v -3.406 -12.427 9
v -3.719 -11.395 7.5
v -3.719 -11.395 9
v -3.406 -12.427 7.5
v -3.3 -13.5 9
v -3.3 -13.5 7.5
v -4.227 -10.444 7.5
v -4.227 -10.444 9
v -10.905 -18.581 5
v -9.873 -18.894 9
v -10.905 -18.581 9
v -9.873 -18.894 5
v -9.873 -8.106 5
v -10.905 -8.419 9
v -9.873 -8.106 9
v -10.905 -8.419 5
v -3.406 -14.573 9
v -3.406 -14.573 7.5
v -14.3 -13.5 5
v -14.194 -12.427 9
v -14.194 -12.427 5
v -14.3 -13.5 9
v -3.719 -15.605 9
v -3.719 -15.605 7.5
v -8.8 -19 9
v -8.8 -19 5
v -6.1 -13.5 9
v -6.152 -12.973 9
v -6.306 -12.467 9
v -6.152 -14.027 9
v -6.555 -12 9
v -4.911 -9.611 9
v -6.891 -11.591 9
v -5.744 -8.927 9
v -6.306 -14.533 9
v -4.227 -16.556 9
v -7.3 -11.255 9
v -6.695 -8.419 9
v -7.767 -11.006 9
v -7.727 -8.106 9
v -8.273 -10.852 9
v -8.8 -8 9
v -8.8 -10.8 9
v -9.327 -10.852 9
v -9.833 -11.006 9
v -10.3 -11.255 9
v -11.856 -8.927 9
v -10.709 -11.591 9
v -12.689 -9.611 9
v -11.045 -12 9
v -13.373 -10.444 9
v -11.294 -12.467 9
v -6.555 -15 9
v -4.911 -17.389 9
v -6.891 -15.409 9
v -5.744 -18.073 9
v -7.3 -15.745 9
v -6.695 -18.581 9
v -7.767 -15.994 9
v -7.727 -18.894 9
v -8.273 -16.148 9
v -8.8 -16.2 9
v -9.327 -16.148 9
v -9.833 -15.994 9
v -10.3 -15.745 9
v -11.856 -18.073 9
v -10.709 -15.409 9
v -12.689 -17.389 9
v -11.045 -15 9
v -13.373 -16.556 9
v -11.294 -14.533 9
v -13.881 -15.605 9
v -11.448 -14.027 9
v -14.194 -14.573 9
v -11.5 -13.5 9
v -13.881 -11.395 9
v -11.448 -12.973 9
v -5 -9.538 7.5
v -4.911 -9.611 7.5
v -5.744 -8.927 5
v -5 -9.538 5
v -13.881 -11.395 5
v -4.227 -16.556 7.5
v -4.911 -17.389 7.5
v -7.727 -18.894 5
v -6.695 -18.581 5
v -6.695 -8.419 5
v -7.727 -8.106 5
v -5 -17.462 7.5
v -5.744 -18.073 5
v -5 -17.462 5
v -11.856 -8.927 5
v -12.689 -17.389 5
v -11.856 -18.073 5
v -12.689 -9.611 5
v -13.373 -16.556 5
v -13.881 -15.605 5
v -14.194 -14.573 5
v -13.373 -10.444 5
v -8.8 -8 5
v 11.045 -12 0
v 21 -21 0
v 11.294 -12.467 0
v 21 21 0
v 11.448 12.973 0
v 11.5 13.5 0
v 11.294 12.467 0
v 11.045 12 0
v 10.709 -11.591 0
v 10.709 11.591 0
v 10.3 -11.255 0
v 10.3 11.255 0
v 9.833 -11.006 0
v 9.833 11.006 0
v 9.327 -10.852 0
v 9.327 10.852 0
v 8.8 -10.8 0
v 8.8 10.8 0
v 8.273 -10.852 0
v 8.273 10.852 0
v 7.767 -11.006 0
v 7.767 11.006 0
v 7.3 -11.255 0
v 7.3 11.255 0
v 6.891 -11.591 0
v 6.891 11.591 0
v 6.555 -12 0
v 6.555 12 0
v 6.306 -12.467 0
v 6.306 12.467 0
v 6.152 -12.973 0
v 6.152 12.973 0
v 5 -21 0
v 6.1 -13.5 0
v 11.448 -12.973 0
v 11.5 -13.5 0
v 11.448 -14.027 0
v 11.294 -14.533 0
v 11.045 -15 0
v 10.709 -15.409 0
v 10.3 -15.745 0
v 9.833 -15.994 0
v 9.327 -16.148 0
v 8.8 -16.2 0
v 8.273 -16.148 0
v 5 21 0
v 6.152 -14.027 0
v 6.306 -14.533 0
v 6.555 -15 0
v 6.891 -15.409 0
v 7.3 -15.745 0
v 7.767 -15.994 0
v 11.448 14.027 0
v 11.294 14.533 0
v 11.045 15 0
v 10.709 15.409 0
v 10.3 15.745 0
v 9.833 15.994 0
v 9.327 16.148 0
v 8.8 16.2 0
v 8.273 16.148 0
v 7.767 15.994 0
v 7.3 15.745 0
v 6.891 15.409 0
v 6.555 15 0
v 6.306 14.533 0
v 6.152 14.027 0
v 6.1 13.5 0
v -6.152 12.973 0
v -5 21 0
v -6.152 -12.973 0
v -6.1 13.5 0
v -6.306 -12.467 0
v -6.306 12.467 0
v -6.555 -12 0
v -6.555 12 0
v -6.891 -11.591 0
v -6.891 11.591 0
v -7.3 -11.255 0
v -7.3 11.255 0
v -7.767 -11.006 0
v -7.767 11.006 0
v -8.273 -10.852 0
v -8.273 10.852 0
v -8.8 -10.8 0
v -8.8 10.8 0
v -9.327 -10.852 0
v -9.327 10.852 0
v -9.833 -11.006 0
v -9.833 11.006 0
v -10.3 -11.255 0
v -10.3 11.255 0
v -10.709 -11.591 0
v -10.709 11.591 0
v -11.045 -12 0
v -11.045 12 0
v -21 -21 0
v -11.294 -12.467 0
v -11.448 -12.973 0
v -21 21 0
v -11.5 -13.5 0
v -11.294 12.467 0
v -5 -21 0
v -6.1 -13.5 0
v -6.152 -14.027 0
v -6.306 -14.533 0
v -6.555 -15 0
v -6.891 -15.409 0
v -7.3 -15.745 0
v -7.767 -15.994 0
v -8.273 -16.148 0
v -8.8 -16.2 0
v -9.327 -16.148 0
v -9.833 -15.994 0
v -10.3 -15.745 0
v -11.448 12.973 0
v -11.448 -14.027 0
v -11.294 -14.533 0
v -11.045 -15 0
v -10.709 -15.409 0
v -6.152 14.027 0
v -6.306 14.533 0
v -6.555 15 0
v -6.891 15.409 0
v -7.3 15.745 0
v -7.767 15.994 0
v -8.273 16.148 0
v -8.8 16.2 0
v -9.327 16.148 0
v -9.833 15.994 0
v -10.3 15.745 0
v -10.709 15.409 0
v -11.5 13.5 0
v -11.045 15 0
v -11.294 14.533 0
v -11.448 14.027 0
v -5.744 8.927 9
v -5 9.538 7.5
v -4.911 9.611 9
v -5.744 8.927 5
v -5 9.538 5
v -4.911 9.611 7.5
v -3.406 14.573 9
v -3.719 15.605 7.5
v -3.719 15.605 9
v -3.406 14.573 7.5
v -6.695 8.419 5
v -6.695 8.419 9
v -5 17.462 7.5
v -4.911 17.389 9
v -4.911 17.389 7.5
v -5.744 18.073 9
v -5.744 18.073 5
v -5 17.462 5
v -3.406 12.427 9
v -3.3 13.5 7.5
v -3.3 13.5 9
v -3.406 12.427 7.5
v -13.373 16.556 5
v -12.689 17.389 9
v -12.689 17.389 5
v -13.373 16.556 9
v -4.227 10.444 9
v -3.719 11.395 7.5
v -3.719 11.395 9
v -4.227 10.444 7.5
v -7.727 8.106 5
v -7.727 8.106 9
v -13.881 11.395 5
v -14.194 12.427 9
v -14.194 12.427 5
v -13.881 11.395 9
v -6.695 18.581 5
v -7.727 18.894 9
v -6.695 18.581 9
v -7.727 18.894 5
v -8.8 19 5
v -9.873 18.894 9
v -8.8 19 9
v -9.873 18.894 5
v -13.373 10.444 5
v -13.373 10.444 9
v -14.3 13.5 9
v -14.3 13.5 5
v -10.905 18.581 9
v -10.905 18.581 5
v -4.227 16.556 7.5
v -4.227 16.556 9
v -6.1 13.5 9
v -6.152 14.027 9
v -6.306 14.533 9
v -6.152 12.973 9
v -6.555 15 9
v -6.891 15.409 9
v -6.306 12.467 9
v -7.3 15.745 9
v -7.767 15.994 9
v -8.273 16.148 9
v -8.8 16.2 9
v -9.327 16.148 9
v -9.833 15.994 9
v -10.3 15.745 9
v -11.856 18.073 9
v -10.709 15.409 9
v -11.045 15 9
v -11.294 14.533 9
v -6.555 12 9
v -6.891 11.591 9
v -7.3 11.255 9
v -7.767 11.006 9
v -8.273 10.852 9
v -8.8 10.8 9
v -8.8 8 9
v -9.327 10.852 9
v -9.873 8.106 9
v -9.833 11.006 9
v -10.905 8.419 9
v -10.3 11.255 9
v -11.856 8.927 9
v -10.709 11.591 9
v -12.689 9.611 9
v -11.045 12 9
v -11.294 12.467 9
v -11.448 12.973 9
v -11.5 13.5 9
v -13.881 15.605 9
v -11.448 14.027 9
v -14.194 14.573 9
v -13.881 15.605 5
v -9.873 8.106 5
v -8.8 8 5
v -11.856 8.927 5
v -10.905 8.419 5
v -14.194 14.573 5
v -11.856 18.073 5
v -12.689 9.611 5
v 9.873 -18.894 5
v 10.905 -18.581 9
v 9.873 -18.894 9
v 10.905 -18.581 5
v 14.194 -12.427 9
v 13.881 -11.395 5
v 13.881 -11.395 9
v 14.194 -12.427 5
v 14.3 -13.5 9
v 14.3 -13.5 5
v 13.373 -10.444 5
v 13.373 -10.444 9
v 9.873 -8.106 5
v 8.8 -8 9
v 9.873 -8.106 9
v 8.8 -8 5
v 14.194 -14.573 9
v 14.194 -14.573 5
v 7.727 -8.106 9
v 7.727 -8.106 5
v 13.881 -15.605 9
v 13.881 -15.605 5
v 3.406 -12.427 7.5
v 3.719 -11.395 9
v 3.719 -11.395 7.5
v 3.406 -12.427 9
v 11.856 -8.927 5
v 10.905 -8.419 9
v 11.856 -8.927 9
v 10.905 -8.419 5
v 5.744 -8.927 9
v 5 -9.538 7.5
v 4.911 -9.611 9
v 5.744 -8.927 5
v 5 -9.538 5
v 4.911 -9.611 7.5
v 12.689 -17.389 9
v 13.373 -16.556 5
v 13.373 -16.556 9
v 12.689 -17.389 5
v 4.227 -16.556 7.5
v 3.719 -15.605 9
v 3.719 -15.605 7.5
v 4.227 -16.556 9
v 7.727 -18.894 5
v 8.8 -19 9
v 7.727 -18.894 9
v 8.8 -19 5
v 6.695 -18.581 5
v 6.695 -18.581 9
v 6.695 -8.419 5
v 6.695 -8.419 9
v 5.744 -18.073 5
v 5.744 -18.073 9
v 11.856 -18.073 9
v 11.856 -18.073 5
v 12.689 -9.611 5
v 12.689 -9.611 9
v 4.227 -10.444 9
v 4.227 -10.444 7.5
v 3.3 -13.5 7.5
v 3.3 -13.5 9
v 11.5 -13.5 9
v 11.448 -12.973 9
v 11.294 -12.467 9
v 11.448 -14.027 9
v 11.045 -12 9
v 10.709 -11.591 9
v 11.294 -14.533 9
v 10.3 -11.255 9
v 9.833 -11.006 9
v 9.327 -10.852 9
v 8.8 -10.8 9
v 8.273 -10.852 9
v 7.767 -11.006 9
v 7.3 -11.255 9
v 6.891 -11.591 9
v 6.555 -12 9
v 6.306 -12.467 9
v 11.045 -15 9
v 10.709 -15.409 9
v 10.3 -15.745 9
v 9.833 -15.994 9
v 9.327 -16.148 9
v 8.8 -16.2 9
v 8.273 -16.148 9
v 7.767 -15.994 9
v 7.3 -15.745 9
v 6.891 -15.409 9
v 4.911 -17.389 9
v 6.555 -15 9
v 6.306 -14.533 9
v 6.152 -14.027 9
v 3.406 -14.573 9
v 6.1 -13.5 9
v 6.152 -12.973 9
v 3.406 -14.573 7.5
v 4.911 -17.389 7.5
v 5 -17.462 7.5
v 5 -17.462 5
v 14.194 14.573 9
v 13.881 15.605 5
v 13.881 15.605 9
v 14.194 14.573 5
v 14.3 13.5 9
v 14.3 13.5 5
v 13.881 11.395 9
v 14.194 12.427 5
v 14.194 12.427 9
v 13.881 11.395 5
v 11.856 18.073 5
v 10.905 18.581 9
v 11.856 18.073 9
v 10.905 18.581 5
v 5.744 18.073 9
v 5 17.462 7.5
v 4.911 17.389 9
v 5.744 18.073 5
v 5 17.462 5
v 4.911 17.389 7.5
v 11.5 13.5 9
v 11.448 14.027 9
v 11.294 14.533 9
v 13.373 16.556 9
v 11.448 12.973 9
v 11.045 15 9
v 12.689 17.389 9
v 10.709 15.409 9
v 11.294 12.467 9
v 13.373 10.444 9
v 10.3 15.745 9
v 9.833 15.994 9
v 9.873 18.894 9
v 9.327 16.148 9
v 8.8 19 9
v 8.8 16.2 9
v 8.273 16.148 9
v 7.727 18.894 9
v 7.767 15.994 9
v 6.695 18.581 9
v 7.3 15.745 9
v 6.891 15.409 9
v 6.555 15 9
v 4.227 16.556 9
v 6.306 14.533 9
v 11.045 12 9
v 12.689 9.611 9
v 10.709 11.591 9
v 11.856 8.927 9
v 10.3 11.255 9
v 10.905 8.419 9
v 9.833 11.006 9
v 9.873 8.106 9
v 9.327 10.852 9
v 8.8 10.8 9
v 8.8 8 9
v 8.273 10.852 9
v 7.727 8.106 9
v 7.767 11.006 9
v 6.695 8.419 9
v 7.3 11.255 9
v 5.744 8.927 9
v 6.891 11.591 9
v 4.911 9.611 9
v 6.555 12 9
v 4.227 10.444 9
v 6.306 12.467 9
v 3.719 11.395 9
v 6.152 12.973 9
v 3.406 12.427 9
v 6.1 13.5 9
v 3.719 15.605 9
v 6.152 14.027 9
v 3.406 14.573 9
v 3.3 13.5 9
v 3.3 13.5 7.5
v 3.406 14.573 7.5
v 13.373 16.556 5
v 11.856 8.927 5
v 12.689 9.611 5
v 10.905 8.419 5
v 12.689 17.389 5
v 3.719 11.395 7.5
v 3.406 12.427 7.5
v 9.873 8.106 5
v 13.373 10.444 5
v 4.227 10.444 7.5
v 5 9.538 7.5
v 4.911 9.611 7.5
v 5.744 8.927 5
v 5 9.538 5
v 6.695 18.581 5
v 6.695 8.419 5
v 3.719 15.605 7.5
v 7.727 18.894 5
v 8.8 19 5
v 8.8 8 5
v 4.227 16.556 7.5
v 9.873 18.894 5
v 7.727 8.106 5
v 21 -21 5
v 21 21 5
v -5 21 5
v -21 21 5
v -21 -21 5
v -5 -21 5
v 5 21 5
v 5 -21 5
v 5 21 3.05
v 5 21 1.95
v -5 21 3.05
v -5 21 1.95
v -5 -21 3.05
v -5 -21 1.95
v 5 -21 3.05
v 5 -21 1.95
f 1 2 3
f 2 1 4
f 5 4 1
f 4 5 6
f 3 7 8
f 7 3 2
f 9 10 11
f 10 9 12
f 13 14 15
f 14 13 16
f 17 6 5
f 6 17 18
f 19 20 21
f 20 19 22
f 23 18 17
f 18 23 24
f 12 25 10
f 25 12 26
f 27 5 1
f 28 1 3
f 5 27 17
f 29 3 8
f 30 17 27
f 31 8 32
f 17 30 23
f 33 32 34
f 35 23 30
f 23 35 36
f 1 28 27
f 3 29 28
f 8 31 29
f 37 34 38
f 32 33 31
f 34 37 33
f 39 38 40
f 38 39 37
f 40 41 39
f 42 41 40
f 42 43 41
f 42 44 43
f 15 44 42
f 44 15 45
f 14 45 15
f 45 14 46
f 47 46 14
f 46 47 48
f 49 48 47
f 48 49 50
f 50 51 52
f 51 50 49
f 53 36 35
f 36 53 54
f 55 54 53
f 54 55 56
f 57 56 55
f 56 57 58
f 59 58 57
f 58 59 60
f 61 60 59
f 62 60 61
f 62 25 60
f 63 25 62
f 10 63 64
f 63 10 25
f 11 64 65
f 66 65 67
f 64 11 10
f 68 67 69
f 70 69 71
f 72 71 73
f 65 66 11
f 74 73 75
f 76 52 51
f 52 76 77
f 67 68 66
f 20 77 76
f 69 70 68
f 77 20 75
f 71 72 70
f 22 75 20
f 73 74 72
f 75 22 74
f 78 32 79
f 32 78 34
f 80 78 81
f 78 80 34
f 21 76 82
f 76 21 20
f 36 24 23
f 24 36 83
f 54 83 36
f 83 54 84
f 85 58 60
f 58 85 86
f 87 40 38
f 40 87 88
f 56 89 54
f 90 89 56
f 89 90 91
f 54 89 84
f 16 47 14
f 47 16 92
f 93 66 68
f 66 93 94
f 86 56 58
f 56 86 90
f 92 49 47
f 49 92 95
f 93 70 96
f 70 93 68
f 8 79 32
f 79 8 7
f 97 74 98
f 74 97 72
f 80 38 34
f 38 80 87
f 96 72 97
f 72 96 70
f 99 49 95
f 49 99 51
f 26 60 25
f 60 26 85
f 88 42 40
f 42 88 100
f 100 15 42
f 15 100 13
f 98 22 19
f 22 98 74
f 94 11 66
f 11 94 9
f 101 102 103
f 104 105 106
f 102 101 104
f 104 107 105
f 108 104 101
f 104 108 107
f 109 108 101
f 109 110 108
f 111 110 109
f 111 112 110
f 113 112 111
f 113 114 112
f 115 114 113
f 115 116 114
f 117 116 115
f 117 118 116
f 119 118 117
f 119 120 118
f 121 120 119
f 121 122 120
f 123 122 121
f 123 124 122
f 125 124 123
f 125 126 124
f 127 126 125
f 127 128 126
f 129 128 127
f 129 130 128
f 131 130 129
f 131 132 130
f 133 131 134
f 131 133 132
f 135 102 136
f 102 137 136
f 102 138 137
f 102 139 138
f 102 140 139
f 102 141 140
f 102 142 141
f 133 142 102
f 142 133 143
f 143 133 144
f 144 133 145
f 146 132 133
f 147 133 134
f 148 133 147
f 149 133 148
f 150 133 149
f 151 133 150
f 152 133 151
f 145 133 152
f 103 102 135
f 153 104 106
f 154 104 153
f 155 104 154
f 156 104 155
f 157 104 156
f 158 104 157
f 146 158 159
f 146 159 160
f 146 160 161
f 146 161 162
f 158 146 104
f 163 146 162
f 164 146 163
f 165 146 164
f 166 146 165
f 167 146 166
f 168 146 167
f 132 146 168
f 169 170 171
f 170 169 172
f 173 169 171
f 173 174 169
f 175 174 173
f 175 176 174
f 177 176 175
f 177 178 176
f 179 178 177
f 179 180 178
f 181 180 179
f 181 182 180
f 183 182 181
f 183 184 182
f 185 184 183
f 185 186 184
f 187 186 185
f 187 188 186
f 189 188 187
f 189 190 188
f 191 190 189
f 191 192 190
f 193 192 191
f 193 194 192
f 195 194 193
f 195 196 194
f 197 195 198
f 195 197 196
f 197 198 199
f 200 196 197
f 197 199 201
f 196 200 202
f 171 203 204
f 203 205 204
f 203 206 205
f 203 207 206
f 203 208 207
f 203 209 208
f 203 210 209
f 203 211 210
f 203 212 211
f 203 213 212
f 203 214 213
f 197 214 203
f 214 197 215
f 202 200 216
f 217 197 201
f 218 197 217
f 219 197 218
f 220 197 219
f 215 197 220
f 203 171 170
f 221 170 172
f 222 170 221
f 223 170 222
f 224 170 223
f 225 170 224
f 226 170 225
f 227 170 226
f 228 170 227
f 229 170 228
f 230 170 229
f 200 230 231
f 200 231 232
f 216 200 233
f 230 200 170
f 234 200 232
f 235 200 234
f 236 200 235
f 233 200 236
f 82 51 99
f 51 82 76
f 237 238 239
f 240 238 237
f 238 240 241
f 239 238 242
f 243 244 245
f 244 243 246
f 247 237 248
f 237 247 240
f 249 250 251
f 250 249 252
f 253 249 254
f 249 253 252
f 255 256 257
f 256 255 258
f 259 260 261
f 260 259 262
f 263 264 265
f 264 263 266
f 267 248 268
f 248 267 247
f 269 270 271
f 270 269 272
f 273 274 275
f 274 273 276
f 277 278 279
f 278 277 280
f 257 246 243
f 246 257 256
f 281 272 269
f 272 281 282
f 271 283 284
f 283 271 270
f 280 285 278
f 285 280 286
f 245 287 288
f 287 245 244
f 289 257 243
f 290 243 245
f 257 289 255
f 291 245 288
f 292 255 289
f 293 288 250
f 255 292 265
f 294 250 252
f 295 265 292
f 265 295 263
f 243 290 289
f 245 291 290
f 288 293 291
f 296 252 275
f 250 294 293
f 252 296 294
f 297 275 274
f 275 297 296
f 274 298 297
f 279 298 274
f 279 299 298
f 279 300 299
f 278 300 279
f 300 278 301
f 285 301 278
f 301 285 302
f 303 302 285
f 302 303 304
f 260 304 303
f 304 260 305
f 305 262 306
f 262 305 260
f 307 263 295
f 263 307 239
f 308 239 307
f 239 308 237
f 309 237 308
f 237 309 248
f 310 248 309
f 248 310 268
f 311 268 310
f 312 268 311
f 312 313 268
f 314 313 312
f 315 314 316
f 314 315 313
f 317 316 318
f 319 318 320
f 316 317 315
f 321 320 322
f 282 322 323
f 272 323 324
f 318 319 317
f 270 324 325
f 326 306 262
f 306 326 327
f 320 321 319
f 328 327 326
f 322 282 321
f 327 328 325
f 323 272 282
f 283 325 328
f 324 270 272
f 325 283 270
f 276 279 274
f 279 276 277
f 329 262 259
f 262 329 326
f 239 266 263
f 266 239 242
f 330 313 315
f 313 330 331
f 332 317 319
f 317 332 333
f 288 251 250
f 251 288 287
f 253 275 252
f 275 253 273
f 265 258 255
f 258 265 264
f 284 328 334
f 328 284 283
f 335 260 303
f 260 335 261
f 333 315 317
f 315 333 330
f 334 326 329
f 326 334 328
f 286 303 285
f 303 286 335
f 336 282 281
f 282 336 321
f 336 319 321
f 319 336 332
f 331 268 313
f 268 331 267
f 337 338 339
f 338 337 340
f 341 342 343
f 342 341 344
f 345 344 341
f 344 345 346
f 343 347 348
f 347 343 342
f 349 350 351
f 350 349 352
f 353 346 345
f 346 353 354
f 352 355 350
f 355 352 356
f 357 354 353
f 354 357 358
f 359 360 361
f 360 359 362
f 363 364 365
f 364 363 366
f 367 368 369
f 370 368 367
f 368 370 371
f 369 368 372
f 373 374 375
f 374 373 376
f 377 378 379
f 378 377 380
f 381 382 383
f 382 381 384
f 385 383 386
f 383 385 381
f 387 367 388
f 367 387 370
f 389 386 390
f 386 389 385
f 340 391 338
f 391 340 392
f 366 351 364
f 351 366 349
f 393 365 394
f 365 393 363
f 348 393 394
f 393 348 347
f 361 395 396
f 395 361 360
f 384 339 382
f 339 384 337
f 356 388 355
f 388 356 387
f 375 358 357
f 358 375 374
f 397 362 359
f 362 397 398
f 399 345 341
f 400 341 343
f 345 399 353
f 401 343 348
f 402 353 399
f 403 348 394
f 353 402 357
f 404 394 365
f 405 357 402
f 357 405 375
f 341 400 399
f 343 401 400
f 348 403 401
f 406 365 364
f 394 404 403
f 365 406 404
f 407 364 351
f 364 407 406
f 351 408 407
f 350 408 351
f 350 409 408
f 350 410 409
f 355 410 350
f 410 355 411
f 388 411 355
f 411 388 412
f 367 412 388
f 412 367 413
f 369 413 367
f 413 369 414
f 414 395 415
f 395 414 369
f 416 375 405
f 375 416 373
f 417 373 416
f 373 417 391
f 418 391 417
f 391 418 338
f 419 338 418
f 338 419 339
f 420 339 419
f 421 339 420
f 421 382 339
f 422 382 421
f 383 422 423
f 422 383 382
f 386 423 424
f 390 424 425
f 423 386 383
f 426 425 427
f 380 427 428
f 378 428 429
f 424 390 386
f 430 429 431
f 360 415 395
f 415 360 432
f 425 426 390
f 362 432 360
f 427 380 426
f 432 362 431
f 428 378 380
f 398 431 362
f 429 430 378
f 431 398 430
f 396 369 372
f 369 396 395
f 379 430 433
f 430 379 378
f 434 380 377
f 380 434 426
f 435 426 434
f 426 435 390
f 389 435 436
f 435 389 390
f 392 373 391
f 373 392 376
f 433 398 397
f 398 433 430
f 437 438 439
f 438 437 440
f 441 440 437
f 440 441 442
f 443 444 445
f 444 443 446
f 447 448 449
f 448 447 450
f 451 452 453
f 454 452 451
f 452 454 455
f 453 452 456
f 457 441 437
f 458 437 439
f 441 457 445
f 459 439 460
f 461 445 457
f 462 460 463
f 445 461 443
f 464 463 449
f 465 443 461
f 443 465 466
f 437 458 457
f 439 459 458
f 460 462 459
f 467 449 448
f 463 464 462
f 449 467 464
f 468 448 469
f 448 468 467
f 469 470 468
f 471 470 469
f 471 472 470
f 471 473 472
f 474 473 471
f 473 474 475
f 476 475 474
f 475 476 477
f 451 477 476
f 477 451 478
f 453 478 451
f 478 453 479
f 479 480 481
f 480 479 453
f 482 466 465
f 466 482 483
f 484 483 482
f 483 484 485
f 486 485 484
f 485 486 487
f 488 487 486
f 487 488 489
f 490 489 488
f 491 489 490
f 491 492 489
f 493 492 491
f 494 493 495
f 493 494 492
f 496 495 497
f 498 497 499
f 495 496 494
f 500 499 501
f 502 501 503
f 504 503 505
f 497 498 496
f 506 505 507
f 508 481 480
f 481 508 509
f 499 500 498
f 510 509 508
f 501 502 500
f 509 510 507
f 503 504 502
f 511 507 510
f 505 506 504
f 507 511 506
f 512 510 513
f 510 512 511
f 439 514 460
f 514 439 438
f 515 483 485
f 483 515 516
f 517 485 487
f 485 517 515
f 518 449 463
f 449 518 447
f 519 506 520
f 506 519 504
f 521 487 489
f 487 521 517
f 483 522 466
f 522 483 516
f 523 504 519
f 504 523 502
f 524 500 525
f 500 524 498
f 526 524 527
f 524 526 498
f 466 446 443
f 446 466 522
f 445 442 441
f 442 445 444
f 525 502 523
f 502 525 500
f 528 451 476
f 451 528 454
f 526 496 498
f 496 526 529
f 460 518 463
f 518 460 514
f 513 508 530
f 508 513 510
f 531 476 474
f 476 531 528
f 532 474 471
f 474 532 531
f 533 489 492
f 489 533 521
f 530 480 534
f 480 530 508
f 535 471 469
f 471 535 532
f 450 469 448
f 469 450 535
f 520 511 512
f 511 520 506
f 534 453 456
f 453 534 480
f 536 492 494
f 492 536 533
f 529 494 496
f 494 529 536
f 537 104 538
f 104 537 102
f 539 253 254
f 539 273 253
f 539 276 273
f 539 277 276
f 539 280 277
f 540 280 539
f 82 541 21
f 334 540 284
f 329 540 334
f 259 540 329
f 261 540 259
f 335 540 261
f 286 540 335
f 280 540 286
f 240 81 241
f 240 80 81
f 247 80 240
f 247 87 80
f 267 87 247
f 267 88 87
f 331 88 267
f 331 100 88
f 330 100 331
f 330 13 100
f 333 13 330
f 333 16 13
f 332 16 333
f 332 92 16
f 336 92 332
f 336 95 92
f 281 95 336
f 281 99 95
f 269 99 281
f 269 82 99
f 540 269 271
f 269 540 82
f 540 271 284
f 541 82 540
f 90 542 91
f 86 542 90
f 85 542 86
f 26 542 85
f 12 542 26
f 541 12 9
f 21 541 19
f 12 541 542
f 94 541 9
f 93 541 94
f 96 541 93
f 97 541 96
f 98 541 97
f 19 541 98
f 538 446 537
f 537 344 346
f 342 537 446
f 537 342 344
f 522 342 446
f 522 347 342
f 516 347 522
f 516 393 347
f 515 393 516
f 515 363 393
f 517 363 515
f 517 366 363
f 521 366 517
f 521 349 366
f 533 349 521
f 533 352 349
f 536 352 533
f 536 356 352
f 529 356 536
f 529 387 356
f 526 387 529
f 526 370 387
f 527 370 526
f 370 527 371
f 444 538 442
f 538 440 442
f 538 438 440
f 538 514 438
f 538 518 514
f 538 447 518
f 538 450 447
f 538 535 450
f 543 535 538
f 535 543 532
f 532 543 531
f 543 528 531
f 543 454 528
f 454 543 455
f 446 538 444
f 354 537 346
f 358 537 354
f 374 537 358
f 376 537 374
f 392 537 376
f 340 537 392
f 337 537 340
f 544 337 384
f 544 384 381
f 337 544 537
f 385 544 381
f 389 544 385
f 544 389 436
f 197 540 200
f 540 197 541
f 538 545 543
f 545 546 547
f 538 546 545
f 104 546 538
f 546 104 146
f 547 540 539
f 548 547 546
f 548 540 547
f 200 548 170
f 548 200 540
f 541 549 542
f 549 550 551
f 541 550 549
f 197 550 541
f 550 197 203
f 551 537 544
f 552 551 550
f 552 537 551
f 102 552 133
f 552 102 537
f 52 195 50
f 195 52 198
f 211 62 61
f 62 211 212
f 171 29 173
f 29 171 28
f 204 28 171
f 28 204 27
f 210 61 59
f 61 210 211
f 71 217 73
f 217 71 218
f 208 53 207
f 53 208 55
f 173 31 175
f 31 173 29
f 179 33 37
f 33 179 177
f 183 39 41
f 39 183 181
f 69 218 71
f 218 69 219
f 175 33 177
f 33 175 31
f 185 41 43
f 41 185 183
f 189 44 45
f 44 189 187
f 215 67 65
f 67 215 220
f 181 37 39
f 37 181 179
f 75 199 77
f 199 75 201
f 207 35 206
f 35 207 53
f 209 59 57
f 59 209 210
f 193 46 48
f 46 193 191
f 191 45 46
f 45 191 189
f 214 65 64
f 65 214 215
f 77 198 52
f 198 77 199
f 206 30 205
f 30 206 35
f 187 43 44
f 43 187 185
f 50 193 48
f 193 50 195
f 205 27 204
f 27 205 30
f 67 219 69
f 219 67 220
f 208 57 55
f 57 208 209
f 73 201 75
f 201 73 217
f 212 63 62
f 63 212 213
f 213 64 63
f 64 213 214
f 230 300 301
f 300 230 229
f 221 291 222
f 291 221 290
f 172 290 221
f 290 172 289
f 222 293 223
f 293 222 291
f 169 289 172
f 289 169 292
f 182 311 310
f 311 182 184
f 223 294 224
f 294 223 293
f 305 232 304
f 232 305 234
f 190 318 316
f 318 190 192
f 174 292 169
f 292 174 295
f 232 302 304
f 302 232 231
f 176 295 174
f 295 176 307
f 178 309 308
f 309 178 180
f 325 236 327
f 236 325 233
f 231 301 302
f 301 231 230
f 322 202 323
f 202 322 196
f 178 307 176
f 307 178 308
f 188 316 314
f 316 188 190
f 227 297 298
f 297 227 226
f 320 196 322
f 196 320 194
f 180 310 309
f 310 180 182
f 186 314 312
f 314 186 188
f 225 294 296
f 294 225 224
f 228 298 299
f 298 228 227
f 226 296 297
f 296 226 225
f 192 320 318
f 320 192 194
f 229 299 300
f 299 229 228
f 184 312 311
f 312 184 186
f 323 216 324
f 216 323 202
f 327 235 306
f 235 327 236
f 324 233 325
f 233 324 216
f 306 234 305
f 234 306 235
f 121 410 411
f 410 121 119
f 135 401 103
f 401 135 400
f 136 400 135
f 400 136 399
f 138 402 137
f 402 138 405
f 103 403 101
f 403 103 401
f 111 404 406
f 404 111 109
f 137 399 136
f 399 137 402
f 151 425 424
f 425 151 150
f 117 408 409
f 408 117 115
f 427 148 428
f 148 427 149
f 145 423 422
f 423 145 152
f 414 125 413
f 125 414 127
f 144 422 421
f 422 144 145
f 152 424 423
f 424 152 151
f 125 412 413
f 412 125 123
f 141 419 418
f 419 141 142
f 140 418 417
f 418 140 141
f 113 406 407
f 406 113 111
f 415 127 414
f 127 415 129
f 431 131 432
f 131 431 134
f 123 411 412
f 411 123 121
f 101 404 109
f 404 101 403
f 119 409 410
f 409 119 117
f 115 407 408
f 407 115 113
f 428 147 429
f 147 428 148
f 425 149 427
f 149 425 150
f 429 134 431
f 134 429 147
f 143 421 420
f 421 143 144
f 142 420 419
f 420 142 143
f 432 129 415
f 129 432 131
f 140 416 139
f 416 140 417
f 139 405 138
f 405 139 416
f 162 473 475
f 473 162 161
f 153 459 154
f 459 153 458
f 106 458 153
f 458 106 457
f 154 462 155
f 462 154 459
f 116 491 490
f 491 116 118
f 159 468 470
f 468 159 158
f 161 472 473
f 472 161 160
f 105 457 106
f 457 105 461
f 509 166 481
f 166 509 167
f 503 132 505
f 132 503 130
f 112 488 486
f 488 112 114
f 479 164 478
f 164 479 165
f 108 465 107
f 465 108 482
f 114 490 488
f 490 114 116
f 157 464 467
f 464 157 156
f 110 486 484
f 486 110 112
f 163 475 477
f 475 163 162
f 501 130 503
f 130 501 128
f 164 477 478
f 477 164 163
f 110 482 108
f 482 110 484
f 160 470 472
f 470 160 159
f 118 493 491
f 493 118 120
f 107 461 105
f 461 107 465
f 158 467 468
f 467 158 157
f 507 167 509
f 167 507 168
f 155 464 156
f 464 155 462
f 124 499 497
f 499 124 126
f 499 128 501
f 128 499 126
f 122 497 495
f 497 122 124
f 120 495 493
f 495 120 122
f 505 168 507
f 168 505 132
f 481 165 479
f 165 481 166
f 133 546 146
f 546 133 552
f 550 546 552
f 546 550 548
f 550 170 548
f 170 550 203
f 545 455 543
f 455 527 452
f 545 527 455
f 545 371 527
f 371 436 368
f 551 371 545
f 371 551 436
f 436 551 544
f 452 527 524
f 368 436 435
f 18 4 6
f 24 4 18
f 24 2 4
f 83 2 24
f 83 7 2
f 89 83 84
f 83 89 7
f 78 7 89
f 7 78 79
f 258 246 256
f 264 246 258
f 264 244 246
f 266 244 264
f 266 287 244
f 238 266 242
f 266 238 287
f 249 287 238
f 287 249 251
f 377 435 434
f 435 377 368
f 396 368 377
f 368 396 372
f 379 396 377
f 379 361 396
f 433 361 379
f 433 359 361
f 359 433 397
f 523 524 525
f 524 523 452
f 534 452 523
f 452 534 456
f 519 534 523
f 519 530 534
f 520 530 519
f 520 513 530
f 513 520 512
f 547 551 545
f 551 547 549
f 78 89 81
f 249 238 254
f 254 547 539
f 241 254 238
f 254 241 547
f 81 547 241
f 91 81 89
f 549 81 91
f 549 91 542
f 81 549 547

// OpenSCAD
$fn = 32;

// ----------------------------------------------------------------------
// Living hinge: 42 x 42 mm plates, 1.1 mm flexible web
// ----------------------------------------------------------------------

// --- parameters (mm) ---
plate_len = 16;           // plate length outside the web
plate_w = 42;             // plate width
thick = 5;                // plate thickness
web_half = 5;             // half width of the flex band
web_t = 1.1;              // flexible web thickness
web_z = 1.95;             // web position inside the thickness
boss_d = 11;              // screw boss diameter
boss_h = 9;               // screw boss height
boss_x = 8.8;             // screw boss distance from the web
screw_d = 5.4;            // screw hole

difference() {
  union() {
    /* one flat strip, later thinned at the middle */
    translate([-21, -21, 0]) cube([42, 42, 5]);
    /* screw bosses, sunk 0.5 mm into the plates */
    for (sx = [-8.8, 8.8]) {
      for (sy = [-13.5, 13.5]) {
        translate([sx, sy, 0]) cylinder(h = boss_h, d = boss_d);
      }
    }
  }
  /* channel from below: leaves the web on top of it */
  translate([-5, -23.5, -2.5]) cube([10, 47, 4.45]);
  /* channel from above: thins the web down to web_t */
  translate([-5, -23.5, 3.05]) cube([10, 47, 4.45]);
  /* screw holes through the bosses */
  for (sx = [-8.8, 8.8]) {
    for (sy = [-13.5, 13.5]) {
      translate([sx, sy, -2.5]) cylinder(h = boss_h + 5, d = screw_d);
    }
  }
}
